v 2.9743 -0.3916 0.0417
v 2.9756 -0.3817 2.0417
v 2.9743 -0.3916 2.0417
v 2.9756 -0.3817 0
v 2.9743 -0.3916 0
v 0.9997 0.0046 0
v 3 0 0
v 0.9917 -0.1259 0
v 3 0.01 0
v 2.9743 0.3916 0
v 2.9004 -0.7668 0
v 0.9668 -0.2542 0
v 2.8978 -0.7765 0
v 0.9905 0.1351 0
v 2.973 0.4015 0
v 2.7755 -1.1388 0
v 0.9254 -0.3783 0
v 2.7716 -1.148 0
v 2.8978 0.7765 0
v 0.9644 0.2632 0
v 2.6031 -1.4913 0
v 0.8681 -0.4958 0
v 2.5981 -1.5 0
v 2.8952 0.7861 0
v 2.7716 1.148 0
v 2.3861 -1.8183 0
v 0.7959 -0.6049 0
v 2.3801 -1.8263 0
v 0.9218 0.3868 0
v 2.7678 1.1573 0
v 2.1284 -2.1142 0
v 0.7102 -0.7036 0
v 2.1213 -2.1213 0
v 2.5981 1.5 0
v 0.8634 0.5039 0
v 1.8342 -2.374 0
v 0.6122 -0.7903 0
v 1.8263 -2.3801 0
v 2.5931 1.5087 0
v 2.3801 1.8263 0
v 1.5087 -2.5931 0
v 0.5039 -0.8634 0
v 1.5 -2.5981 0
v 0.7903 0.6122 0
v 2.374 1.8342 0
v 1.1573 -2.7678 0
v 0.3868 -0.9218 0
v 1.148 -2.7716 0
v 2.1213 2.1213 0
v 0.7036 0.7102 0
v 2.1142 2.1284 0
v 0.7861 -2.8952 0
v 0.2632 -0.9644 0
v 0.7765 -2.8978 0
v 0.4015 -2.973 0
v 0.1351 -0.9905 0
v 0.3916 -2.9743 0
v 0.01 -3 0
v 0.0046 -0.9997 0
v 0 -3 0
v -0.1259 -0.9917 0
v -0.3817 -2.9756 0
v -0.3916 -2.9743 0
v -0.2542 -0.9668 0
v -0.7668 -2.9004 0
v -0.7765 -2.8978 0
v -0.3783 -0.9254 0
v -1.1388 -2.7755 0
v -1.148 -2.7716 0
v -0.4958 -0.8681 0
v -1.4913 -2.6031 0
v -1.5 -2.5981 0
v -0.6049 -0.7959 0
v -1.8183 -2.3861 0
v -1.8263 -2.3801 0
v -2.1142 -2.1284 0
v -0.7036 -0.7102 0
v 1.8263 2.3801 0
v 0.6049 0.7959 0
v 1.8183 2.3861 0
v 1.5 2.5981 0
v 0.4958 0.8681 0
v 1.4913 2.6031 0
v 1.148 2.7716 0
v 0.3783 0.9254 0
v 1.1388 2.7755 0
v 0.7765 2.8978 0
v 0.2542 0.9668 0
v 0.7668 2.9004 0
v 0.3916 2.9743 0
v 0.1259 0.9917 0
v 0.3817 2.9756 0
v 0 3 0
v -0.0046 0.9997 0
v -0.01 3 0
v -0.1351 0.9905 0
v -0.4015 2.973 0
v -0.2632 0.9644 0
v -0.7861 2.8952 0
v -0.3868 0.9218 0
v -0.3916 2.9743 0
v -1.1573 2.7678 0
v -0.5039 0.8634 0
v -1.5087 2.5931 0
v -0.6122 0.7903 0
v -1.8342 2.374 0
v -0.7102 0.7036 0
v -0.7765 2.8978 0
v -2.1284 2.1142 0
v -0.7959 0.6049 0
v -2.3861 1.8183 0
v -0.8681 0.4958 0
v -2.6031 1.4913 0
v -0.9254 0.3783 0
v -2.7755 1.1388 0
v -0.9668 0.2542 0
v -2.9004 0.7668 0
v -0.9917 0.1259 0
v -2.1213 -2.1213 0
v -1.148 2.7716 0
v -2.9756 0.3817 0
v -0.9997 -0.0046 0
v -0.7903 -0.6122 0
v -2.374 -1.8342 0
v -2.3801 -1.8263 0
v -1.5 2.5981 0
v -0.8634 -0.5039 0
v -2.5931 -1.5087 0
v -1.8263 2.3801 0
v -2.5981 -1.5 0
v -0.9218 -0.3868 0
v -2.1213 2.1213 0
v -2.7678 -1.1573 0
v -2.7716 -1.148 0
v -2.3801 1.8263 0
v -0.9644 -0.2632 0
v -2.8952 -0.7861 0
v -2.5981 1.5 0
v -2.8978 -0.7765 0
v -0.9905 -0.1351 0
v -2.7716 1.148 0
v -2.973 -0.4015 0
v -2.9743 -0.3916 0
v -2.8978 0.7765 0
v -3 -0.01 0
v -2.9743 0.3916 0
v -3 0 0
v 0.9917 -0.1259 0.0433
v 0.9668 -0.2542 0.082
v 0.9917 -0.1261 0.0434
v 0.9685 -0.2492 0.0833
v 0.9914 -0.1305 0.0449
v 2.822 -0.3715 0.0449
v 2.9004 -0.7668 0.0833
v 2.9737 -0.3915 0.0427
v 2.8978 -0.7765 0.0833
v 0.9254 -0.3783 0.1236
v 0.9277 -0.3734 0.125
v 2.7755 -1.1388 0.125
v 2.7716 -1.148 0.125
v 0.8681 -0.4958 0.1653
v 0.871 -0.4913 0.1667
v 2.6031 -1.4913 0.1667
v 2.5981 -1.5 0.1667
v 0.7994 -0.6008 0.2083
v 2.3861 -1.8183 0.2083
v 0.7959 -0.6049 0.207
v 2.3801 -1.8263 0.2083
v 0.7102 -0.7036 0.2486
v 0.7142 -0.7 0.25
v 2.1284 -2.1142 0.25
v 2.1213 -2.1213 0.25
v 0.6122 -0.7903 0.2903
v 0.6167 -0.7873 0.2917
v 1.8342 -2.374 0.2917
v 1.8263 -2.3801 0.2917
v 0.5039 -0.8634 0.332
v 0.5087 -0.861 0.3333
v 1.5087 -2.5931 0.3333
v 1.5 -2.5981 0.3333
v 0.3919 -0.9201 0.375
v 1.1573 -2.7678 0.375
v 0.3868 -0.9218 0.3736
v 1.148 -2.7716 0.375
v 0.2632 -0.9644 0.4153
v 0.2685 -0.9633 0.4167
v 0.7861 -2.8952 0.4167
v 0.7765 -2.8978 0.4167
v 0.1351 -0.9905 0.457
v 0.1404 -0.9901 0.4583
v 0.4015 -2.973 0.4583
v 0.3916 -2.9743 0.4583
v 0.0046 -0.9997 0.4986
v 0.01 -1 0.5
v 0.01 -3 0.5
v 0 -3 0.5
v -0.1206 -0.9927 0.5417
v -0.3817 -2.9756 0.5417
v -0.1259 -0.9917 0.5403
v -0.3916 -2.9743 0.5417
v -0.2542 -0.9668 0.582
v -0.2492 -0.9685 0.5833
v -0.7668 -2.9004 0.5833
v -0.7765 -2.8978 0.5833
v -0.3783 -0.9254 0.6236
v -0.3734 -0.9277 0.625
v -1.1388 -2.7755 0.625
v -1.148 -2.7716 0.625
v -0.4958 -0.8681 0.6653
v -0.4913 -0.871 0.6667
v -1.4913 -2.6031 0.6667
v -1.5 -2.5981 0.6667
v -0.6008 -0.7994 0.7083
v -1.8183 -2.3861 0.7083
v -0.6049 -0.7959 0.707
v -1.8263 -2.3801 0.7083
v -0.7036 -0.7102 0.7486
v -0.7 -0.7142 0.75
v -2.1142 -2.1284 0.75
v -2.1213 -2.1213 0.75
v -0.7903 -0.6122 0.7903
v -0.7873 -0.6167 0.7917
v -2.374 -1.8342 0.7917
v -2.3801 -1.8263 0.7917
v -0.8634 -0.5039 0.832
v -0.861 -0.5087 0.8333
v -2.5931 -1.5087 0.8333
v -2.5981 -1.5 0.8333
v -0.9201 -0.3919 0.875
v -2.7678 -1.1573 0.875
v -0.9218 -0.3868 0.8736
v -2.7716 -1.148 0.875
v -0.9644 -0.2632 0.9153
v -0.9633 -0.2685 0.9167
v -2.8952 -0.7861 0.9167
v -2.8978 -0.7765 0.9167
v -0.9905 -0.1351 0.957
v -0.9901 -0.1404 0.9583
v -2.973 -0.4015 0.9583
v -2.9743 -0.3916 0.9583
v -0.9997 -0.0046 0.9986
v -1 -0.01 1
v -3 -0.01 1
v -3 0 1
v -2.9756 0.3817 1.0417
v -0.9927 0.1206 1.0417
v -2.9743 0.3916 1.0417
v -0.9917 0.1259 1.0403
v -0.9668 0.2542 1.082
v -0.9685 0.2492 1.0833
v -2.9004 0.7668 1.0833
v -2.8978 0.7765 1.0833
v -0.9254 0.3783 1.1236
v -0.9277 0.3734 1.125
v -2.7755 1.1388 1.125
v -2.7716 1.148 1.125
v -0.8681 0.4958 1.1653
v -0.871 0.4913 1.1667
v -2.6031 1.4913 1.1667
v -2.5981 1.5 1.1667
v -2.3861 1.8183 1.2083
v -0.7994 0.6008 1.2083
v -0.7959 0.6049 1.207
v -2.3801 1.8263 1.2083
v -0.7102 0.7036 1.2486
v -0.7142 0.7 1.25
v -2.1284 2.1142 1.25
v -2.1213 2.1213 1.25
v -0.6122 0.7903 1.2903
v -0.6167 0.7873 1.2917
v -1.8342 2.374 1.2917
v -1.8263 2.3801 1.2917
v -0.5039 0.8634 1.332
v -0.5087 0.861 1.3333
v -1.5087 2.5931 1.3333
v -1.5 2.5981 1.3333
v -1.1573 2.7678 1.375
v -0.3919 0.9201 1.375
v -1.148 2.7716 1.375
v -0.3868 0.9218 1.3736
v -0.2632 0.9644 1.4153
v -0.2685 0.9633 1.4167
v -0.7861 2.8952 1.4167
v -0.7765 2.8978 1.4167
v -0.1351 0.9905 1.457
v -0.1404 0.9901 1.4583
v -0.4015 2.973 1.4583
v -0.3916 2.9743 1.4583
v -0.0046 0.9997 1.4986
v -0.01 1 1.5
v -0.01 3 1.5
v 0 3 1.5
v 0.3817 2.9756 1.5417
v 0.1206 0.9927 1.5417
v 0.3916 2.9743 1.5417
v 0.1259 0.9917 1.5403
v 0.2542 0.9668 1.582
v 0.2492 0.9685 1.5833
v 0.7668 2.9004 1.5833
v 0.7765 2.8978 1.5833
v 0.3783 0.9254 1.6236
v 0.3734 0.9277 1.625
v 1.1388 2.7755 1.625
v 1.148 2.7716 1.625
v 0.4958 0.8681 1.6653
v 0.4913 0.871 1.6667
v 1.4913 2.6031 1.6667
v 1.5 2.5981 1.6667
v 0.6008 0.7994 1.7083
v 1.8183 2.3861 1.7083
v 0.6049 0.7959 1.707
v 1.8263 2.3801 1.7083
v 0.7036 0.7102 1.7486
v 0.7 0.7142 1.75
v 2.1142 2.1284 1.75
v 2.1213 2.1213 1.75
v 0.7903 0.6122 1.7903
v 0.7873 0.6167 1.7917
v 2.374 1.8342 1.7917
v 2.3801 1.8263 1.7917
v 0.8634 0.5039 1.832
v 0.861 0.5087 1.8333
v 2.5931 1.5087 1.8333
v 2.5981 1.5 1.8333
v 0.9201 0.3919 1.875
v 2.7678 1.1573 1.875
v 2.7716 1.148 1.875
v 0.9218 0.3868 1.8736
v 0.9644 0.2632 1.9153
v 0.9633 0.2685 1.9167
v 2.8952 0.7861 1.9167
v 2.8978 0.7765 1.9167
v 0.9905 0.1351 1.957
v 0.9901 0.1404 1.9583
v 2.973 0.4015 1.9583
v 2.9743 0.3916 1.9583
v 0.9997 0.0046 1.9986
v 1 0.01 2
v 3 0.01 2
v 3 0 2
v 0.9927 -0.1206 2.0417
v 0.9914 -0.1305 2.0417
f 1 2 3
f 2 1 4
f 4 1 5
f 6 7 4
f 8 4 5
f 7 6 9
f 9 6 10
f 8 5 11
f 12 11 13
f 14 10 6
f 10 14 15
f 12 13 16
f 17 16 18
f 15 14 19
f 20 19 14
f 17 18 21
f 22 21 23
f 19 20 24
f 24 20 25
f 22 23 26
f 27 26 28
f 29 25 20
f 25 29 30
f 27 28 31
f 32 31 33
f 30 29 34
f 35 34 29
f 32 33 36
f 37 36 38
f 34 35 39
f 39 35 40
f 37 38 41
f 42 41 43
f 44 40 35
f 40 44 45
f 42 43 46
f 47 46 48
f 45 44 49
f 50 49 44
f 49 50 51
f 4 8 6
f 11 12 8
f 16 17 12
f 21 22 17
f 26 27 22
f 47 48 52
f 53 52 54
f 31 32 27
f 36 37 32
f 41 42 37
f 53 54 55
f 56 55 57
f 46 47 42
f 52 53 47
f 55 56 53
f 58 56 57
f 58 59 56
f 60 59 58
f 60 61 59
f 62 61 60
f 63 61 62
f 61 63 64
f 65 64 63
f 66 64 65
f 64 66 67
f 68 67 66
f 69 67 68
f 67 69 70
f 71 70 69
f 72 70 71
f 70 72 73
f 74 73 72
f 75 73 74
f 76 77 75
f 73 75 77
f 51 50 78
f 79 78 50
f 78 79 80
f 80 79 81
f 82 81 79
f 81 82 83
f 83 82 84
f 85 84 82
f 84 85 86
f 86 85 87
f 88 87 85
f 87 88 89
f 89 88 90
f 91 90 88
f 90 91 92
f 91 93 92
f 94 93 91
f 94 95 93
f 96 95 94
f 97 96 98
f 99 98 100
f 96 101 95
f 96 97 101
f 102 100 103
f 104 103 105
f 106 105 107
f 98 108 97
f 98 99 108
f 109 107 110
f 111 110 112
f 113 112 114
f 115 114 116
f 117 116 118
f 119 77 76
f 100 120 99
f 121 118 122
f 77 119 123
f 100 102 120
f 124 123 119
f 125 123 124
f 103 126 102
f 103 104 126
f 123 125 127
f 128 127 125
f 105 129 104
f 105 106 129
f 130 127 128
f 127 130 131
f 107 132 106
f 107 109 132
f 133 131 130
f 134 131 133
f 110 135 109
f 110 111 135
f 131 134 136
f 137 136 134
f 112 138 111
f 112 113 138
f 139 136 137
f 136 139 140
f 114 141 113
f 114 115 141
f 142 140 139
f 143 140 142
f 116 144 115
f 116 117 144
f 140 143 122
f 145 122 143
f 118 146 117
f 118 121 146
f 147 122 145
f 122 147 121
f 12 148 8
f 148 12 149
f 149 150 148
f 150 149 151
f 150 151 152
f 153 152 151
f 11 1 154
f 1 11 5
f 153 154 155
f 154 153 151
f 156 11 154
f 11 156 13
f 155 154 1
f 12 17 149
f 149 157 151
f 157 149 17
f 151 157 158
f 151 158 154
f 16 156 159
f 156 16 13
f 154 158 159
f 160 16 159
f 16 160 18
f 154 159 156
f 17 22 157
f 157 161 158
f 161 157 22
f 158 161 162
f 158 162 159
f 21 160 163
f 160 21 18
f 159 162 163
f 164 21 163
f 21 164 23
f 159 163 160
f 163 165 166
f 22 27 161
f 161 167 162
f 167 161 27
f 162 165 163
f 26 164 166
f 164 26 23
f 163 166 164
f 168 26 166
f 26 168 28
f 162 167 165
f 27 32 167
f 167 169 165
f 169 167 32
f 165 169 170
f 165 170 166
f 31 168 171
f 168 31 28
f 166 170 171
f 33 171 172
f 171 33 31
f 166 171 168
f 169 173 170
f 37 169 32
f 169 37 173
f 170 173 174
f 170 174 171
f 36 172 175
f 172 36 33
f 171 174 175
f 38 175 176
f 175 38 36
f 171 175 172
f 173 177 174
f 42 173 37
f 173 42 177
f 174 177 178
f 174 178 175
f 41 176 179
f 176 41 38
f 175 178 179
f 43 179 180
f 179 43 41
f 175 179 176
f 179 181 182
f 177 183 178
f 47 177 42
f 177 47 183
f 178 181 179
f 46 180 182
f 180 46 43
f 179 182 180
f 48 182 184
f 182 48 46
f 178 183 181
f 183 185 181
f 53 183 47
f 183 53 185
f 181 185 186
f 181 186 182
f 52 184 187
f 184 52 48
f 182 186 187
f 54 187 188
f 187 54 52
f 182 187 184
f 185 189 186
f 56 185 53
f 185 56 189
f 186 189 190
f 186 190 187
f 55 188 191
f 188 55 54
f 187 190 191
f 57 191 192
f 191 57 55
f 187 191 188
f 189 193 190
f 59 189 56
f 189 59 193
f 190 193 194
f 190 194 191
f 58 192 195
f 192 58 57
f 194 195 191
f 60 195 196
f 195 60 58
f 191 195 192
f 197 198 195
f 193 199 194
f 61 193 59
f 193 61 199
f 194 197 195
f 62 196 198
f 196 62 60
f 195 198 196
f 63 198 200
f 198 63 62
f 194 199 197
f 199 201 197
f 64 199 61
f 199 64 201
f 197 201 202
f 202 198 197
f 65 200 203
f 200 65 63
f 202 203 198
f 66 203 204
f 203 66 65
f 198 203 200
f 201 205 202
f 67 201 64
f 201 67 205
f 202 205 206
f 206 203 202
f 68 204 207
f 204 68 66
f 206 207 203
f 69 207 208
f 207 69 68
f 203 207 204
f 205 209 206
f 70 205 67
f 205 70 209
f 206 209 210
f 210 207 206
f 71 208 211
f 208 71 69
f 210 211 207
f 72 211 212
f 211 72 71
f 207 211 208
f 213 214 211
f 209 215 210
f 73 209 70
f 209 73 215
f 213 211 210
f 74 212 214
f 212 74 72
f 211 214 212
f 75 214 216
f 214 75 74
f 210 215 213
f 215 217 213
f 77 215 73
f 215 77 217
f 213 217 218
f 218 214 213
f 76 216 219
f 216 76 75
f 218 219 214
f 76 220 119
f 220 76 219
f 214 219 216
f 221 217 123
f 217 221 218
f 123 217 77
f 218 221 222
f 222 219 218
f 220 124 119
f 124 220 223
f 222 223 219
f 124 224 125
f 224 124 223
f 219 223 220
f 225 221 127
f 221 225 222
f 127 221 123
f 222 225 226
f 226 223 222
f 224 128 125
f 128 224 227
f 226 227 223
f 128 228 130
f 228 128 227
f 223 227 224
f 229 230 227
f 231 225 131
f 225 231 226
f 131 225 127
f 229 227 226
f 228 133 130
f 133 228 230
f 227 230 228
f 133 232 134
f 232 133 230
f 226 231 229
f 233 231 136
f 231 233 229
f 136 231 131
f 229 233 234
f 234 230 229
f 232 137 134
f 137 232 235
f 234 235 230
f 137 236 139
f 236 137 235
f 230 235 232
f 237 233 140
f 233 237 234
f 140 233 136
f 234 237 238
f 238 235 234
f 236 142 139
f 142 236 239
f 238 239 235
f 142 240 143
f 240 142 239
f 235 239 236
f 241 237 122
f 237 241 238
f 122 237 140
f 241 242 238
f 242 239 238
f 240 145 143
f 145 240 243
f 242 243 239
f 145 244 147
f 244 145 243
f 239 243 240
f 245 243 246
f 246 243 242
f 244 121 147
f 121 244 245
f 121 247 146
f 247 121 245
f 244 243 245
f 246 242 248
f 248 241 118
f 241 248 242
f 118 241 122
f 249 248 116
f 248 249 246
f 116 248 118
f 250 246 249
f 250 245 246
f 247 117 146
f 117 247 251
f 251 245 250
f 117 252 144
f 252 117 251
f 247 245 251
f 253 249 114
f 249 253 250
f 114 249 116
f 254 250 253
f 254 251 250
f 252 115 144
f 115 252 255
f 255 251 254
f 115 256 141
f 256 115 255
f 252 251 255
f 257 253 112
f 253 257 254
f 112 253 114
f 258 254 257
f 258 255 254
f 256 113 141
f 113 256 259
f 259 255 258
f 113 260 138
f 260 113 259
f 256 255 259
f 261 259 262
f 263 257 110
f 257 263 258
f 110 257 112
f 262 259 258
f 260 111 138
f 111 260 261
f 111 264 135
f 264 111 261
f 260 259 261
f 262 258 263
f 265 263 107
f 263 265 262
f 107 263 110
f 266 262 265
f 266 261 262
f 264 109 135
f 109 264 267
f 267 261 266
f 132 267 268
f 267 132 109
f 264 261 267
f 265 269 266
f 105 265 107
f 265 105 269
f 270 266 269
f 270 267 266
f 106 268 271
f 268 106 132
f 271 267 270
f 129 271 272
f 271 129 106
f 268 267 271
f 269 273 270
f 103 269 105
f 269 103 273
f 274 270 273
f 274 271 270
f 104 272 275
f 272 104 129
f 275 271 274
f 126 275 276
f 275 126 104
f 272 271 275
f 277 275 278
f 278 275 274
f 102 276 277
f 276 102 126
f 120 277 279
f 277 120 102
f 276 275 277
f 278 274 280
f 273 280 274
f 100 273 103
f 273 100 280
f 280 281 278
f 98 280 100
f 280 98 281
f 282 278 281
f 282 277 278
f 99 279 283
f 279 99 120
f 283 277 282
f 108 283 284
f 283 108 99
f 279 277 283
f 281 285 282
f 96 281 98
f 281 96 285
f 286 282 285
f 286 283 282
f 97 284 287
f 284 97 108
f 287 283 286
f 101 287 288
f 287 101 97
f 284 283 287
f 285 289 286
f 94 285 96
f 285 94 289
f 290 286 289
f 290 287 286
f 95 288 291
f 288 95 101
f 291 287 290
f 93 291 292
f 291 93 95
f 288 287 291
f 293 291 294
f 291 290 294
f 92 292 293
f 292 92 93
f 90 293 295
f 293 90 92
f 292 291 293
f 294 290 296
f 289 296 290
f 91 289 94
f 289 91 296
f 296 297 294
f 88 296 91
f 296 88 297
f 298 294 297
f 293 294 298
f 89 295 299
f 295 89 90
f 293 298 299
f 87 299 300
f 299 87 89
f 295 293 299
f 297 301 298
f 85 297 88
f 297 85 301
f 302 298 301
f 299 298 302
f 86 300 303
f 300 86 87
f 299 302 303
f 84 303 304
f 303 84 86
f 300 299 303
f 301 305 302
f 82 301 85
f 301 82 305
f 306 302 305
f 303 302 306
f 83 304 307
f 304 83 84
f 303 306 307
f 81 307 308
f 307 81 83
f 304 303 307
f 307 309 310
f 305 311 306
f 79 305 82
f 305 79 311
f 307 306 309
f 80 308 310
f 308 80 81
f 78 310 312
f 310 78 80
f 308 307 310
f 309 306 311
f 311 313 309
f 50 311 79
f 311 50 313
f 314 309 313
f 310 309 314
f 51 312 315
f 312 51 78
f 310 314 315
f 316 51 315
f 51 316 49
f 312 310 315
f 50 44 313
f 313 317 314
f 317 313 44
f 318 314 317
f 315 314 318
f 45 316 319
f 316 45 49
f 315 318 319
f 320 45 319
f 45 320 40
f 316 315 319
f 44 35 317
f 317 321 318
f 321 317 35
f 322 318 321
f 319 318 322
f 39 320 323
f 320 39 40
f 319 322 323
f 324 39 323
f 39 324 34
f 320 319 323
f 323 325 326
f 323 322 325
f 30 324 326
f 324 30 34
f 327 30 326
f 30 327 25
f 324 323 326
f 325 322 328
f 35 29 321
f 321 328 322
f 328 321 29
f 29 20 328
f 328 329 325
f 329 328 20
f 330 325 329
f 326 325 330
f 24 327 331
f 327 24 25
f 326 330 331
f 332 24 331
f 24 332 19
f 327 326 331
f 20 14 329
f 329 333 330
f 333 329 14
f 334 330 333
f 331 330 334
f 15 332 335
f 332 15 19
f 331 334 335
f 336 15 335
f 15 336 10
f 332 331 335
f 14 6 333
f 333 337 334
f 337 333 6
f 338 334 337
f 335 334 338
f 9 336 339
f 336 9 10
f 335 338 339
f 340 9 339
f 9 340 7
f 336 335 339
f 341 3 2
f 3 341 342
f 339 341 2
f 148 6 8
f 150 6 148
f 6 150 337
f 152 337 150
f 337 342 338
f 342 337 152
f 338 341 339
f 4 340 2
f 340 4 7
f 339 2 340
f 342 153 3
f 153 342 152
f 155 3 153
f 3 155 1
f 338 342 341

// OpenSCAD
N=48;

ratchet();

module ratchet(h=2, r0 = 3, r1 = 1) {
    for (i=[0:N]) {
        hull() {
            ratchet_slice(i, h, r0, r1); 
            ratchet_slice(i+1, h, r0, r1);
        }
    }
}

module ratchet_slice(si, max_h, r0, r1) {
    rotate([0,0,-si*(360/N)]) 
        translate([r1,0,0]) 
        linear_extrude(height=si*(max_h/N)) 
            square([r0-r1,.01]);
}
